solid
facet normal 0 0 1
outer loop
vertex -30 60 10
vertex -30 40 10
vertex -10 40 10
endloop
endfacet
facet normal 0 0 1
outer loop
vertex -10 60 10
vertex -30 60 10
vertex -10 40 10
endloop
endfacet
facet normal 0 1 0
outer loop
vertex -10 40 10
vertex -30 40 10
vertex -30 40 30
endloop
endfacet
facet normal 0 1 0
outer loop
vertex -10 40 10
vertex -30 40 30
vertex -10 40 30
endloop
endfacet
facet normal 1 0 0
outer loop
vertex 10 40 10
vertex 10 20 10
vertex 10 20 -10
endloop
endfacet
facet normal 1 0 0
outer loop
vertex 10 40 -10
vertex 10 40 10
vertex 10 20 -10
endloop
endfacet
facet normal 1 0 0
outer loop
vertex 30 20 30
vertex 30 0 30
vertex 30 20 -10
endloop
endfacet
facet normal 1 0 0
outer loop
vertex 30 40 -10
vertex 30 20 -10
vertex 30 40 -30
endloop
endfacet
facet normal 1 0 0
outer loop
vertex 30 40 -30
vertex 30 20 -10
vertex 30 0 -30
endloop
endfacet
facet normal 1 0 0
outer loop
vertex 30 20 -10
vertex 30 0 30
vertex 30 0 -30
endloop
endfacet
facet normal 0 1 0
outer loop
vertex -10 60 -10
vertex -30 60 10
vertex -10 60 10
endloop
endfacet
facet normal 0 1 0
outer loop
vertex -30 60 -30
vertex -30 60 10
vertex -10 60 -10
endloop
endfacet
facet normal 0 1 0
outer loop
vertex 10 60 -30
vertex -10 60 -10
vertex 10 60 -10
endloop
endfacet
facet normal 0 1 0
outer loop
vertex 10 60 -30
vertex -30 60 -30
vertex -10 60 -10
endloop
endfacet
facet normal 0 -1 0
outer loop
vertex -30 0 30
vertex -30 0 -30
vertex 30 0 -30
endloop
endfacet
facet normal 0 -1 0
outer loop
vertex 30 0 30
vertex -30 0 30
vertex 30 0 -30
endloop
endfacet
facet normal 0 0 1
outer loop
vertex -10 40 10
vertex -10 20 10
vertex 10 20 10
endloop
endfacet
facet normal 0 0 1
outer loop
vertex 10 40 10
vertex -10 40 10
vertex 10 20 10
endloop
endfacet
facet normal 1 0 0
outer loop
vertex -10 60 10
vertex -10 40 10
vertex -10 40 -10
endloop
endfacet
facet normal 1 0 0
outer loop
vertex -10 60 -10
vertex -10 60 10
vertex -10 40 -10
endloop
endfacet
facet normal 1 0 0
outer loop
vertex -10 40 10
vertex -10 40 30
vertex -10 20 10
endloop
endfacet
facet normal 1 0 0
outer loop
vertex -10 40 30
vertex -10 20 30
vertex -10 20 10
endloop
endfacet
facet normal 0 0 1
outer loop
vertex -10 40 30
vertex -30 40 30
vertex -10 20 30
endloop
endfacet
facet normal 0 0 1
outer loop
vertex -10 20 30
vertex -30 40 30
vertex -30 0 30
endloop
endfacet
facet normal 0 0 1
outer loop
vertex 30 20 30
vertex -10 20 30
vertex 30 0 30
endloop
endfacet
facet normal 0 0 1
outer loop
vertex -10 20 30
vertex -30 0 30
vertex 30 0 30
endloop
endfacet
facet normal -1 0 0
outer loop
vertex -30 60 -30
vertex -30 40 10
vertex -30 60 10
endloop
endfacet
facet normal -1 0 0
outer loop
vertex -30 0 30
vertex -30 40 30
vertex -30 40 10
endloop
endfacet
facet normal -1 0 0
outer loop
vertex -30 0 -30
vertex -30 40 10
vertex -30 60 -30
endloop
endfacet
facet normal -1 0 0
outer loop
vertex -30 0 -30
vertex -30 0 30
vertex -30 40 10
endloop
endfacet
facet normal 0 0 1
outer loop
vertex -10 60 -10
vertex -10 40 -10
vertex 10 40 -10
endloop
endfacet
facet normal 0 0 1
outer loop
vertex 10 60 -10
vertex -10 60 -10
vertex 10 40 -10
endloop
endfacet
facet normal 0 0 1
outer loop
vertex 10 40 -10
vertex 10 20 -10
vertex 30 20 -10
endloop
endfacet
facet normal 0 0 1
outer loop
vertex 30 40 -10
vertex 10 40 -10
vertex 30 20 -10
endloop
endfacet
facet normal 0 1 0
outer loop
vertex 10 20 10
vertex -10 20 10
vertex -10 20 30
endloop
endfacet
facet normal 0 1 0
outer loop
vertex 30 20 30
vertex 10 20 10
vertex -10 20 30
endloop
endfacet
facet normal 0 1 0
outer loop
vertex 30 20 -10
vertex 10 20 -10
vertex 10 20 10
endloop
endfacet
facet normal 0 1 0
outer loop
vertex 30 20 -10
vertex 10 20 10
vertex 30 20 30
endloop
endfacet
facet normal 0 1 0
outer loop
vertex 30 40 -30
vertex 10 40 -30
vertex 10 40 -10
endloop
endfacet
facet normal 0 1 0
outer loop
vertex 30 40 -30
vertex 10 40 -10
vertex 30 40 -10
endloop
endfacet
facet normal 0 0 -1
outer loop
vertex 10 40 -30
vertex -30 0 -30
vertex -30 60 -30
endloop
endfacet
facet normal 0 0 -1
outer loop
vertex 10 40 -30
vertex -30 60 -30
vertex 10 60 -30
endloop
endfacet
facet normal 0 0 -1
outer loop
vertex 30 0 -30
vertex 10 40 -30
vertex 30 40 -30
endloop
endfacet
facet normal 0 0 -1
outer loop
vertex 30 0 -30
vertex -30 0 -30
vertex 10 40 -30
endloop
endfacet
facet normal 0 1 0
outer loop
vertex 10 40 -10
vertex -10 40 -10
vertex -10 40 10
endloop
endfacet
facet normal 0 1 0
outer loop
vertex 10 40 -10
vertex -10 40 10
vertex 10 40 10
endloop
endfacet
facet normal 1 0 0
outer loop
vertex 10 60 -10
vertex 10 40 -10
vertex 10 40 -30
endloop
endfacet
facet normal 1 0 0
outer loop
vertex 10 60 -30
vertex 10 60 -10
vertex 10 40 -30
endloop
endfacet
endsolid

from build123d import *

# Parameters (mm, degrees)
CROQUIS1_W              = 60
CROQUIS1_H              = 60
SALIENTE_EXTRUIR1_DEPTH = 20
CROQUIS2_W              = 20
CROQUIS2_H              = 20
SALIENTE_EXTRUIR2_DEPTH = 20
CROQUIS3_W              = 20
CROQUIS3_H              = 20
SALIENTE_EXTRUIR4_DEPTH = 40
CROQUIS4_W              = 40
CROQUIS4_H              = 20
SALIENTE_EXTRUIR5_DEPTH = 40
CROQUIS5_W              = 20
CROQUIS5_H              = 20
SALIENTE_EXTRUIR6_DEPTH = 20
CROQUIS6_W              = 20
CROQUIS6_H              = 20
SALIENTE_EXTRUIR7_DEPTH = 20


with BuildPart() as part:
    # Croquis1 → Saliente-Extruir1 (new body)
    with BuildSketch(Plane(origin=(0, 0, 0), x_dir=(1, 0, 0), z_dir=(0, 1, 0))):
        Rectangle(CROQUIS1_W, CROQUIS1_H)
    extrude(amount=SALIENTE_EXTRUIR1_DEPTH)

    # Croquis2 → Saliente-Extruir2 (add)
    with BuildSketch(Plane(origin=(0, 20, 0), x_dir=(1, 0, 0), z_dir=(0, 1, 0))):
        with Locations((-20, -20)):
            Rectangle(CROQUIS2_W, CROQUIS2_H)
    extrude(amount=SALIENTE_EXTRUIR2_DEPTH)

    # Croquis3 → Saliente-Extruir4 (add)
    with BuildSketch(Plane(origin=(0, 20, 0), x_dir=(1, 0, 0), z_dir=(0, 1, 0))):
        with Locations((-20, 0)):
            Rectangle(CROQUIS3_W, CROQUIS3_H)
    extrude(amount=SALIENTE_EXTRUIR4_DEPTH)

    # Croquis4 → Saliente-Extruir5 (add)
    with BuildSketch(Plane(origin=(0, 20, 0), x_dir=(1, 0, 0), z_dir=(0, 1, 0))):
        with Locations((-10, 20)):
            Rectangle(CROQUIS4_W, CROQUIS4_H)
    extrude(amount=SALIENTE_EXTRUIR5_DEPTH)

    # Croquis5 → Saliente-Extruir6 (add)
    with BuildSketch(Plane(origin=(0, 20, 0), x_dir=(1, 0, 0), z_dir=(0, 1, 0))):
        with Locations((20, 20)):
            Rectangle(CROQUIS5_W, CROQUIS5_H)
    extrude(amount=SALIENTE_EXTRUIR6_DEPTH)

    # Croquis6 → Saliente-Extruir7 (add)
    with BuildSketch(Plane(origin=(0, 20, 0), x_dir=(1, 0, 0), z_dir=(0, 1, 0))):
        Rectangle(CROQUIS6_W, CROQUIS6_H)
    extrude(amount=SALIENTE_EXTRUIR7_DEPTH)


solid = part.part
